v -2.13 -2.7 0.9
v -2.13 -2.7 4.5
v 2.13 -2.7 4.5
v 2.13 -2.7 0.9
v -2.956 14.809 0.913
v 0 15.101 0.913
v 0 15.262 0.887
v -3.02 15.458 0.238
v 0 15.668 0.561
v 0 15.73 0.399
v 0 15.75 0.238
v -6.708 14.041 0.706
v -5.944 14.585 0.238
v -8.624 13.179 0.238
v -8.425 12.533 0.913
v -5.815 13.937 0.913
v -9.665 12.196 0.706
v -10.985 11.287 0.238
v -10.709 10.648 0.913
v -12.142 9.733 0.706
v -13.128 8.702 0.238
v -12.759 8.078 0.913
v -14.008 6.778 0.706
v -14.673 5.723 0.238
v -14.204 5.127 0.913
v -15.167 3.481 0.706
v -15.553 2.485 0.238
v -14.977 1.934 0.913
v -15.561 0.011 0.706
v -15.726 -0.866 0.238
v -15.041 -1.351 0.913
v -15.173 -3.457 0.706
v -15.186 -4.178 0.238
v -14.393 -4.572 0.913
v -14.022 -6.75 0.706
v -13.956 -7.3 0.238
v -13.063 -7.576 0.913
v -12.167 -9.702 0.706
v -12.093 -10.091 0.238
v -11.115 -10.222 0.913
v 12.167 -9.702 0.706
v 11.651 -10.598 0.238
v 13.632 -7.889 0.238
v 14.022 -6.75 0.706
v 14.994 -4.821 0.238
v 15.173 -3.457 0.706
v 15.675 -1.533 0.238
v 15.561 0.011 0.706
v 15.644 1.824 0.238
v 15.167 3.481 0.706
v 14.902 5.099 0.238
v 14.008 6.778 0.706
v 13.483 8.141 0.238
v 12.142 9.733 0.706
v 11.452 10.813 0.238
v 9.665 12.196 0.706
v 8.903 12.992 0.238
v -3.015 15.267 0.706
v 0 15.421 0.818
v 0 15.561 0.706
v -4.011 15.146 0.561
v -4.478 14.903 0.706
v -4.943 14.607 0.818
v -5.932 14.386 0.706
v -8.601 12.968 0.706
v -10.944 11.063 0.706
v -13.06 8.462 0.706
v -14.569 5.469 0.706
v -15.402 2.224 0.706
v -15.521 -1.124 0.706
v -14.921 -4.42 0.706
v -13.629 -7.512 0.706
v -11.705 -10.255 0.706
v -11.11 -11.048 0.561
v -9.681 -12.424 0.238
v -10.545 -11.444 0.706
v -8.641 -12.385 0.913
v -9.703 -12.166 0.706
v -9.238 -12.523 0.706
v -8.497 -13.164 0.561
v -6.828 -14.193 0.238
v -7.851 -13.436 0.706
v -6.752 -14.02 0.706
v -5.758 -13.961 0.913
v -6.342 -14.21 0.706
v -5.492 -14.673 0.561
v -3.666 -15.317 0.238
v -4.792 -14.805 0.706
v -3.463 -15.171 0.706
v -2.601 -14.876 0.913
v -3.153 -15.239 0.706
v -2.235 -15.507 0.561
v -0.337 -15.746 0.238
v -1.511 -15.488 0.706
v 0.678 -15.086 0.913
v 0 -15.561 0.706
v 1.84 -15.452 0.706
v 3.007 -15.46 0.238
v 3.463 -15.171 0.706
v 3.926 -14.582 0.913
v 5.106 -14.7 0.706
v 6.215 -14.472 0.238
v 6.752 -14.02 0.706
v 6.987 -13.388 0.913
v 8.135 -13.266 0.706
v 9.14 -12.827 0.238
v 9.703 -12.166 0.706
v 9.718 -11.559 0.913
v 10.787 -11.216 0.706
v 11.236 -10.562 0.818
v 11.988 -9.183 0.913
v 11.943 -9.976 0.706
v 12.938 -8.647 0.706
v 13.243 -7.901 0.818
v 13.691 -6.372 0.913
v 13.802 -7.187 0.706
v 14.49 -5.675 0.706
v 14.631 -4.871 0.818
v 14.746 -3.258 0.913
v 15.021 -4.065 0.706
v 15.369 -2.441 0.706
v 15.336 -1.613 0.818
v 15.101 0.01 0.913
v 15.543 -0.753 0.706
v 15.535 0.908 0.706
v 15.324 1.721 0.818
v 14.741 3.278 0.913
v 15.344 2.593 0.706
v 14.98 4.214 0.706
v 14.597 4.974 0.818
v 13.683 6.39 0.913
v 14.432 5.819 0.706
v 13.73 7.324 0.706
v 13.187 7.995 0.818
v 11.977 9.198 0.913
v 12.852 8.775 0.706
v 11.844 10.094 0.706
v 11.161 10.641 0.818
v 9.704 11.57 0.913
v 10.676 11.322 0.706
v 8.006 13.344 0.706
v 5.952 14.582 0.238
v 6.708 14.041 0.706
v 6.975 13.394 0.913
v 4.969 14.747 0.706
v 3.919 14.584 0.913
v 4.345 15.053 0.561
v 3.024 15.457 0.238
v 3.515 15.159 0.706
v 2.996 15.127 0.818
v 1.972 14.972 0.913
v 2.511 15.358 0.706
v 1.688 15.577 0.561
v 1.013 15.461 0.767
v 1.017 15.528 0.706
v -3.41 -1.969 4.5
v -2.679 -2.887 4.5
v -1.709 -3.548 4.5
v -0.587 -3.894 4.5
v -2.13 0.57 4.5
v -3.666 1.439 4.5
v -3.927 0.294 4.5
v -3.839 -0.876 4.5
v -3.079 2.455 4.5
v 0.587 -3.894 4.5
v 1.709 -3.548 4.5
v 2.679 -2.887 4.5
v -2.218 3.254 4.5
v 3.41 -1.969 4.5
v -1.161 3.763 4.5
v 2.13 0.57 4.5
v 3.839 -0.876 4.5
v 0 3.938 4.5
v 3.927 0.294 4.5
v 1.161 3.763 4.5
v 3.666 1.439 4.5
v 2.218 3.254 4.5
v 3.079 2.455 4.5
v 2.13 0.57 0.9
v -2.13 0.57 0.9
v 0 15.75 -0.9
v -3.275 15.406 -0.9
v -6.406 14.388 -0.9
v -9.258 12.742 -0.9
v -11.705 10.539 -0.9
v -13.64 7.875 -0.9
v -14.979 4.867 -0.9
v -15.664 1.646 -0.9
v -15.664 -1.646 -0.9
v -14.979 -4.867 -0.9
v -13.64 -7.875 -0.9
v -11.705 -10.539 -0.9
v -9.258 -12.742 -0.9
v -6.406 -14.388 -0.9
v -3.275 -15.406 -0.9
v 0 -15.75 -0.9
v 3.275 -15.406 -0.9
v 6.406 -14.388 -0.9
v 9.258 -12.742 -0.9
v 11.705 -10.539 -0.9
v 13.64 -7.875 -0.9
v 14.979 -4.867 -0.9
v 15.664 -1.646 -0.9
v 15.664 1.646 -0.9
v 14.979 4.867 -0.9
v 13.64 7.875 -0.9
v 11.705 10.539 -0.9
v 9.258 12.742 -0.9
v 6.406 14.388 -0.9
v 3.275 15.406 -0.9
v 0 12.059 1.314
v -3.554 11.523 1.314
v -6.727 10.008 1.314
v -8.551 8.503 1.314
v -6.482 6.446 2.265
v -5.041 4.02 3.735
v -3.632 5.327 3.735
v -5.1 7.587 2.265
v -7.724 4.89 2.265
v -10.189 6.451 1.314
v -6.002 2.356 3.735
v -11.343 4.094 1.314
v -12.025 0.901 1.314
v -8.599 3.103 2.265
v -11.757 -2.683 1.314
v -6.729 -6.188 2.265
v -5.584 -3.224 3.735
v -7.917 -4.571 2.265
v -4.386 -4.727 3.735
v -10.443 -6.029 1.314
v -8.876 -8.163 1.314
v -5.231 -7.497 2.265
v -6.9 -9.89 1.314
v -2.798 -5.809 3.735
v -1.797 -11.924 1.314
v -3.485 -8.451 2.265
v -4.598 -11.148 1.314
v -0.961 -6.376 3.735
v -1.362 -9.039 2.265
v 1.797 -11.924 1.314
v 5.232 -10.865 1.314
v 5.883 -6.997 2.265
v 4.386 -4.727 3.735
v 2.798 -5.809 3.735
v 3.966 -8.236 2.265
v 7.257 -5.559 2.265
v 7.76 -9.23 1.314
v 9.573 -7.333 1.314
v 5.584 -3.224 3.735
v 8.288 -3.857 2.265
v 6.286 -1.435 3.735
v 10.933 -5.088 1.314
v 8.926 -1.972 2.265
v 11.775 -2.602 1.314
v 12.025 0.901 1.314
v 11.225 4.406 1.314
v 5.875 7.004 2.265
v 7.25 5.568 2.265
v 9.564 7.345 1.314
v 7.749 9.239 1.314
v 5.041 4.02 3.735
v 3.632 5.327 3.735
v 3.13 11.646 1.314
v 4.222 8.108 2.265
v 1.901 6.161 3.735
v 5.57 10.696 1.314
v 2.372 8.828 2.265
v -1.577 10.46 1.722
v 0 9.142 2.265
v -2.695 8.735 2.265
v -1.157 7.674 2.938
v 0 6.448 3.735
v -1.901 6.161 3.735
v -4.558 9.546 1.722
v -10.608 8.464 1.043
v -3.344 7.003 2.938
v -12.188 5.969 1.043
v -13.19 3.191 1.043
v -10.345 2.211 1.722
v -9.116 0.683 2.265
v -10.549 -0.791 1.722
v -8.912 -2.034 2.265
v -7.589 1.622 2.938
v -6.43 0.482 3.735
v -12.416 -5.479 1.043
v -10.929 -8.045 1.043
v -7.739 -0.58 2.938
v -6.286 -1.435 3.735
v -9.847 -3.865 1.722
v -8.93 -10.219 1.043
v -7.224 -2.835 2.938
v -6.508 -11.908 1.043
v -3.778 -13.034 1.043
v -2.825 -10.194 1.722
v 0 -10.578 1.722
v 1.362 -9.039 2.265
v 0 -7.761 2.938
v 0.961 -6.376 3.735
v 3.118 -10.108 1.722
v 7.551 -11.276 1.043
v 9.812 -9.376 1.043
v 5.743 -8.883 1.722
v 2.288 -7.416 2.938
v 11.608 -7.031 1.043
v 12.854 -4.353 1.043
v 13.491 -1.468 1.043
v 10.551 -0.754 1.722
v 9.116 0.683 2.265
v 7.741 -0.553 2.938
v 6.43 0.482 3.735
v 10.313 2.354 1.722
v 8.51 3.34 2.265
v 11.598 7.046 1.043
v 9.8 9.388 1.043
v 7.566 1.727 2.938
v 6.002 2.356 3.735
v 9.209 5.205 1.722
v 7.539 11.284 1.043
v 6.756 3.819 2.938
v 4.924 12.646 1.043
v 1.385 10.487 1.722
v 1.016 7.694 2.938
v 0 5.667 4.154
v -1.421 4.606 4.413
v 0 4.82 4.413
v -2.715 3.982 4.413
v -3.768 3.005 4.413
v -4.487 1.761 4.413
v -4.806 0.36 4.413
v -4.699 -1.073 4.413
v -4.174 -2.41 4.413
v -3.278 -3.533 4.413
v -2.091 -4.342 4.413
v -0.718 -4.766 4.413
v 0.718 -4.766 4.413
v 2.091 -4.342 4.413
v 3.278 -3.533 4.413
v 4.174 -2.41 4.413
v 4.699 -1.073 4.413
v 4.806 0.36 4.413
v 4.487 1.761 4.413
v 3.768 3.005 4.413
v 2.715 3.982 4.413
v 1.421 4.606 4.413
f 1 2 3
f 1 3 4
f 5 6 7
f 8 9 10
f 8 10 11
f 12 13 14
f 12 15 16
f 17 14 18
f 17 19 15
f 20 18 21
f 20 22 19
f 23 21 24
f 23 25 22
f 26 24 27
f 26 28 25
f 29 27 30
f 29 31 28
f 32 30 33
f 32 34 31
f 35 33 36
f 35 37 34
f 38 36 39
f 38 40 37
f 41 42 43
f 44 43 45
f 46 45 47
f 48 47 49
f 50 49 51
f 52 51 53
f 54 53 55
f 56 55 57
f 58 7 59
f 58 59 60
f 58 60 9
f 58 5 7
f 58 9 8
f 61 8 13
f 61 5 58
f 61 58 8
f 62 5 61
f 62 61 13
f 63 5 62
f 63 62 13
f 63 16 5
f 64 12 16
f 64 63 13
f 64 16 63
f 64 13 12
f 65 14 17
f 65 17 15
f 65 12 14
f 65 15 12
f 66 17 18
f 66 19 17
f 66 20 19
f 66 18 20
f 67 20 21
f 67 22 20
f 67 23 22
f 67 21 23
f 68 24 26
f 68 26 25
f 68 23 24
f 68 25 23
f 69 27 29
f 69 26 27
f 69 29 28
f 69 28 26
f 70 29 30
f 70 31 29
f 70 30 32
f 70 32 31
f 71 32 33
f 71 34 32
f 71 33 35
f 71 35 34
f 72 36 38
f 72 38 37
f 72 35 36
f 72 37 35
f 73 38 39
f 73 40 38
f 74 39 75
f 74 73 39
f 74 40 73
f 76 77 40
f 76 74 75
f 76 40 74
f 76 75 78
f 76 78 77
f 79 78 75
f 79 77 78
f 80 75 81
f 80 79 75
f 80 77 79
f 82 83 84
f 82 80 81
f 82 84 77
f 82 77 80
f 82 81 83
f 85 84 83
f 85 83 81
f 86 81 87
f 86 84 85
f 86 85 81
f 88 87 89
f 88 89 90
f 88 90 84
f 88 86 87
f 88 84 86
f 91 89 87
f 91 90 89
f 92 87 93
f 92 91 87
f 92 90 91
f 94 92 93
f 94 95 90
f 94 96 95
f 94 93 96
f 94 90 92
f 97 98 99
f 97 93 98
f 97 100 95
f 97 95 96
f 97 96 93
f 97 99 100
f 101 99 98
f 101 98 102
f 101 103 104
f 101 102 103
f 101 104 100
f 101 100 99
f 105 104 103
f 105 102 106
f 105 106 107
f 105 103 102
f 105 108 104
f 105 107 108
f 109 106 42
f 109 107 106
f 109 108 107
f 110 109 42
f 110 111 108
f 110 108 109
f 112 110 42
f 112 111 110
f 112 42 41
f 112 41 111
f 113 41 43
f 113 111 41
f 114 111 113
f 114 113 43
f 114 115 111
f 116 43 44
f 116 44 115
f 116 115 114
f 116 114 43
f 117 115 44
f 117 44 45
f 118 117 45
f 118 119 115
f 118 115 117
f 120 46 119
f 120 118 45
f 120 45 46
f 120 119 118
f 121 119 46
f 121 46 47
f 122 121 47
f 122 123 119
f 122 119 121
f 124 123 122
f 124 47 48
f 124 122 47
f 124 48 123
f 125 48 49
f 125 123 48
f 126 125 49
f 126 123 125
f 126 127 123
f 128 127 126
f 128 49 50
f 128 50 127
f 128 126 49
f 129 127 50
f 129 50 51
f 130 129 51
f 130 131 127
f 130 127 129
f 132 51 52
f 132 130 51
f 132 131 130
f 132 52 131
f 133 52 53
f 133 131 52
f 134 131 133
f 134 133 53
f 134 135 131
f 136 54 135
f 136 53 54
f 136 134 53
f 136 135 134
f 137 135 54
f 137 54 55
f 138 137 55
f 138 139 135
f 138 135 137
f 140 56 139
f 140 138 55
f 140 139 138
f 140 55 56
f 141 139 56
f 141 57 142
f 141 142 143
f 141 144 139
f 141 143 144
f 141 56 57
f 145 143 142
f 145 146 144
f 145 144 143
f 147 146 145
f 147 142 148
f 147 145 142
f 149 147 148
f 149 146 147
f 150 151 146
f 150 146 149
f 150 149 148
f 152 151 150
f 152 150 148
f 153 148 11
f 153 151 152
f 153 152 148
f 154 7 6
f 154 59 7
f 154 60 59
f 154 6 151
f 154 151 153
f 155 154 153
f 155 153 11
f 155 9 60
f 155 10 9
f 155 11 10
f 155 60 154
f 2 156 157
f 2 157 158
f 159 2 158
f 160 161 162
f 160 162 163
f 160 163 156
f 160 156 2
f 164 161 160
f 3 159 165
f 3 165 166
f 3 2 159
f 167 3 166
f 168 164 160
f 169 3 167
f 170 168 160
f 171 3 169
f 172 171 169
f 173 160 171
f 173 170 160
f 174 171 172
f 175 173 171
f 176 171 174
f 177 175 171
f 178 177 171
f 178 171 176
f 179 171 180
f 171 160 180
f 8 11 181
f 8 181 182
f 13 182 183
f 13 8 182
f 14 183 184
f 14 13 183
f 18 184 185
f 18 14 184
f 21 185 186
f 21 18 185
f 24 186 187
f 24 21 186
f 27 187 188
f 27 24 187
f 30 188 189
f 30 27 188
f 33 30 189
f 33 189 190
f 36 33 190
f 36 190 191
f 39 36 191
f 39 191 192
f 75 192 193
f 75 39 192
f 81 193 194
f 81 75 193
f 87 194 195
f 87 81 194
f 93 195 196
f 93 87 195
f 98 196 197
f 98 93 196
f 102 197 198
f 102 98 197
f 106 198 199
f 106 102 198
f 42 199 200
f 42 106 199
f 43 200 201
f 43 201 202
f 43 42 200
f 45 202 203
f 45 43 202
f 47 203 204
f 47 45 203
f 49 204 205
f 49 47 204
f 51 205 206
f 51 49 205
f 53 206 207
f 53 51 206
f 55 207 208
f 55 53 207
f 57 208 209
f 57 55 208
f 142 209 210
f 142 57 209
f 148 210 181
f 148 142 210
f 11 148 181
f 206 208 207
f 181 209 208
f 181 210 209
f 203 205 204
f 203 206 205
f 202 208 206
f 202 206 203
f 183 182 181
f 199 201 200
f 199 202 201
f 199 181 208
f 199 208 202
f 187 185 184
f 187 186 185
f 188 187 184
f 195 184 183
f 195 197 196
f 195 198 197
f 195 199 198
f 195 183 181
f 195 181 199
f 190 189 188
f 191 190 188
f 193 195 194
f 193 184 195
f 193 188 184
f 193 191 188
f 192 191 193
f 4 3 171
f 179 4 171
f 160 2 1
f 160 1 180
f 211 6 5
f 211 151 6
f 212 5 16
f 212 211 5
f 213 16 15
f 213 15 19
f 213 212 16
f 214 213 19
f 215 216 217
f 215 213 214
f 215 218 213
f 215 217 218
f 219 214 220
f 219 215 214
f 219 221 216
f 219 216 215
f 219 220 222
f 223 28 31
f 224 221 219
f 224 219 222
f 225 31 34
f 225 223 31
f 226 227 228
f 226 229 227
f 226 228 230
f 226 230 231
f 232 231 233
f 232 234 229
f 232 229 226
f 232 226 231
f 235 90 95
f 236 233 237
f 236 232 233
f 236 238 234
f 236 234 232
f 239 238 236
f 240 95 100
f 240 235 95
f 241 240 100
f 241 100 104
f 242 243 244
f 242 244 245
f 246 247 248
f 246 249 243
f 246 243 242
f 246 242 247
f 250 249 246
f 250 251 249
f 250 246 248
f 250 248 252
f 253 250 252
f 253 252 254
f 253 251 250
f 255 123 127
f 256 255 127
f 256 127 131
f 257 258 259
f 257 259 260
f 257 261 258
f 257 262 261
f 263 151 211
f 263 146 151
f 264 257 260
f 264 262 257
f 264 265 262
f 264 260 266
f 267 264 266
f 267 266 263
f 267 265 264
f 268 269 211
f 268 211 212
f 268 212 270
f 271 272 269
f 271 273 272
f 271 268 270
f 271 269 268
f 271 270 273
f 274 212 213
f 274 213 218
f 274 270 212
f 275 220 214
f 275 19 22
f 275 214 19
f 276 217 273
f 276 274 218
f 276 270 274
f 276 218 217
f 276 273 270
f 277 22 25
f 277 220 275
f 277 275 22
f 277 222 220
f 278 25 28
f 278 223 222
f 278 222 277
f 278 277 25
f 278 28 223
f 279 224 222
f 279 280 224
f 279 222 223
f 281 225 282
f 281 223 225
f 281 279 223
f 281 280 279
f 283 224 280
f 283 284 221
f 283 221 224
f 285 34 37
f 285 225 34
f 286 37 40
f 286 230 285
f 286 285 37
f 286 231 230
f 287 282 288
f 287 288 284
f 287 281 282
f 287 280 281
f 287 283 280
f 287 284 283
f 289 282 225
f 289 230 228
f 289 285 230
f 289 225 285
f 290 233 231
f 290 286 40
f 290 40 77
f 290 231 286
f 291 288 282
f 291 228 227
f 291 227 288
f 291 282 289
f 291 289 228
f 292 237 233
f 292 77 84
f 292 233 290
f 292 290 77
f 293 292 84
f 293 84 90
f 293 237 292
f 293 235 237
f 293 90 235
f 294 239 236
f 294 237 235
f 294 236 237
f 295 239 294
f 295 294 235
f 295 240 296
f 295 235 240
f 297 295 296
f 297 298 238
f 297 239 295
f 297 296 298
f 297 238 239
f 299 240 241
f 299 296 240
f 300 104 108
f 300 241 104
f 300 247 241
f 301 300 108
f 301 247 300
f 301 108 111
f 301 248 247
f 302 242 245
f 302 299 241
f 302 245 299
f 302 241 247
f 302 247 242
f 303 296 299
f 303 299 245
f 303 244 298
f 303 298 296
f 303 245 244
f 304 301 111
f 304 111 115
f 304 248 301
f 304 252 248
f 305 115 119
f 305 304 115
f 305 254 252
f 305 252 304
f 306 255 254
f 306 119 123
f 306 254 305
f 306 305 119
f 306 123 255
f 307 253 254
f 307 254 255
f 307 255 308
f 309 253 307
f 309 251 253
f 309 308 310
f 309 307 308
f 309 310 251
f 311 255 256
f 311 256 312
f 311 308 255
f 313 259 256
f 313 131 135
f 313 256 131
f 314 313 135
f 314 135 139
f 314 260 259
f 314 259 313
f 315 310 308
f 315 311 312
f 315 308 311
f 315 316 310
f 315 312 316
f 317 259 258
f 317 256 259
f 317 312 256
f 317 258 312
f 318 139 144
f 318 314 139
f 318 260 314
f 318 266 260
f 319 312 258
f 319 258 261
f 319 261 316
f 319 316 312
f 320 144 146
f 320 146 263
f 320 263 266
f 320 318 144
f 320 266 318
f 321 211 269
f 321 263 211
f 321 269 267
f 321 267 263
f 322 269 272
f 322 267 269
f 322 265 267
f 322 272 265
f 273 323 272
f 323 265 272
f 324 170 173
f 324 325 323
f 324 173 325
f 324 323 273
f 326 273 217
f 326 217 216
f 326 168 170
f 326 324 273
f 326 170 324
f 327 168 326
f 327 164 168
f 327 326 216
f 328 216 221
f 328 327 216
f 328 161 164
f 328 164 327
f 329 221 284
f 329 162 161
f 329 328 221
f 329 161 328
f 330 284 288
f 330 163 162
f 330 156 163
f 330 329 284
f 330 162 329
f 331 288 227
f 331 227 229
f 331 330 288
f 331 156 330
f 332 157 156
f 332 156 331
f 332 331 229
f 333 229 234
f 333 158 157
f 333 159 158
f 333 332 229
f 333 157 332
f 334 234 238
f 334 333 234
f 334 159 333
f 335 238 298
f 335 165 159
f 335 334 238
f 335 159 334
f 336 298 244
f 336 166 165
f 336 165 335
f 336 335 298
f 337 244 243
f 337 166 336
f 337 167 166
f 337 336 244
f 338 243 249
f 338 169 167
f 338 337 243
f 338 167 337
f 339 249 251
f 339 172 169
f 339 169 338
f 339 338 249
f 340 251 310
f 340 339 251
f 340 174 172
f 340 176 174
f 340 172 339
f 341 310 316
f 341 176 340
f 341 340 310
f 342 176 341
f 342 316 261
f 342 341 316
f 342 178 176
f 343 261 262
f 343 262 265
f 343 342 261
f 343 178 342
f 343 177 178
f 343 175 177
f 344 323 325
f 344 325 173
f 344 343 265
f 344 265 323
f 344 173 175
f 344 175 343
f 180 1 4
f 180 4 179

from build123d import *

# Parameters (mm, degrees)
F0_W     = 17.5
F0_H     = 2
F2_W     = 4
F2_H     = 4
F3_DEPTH = 4
F4_R     = 0.75
F5_SCALE = 0.9
F6_DEPTH = 0.33
F7_DEPTH = 0.33
F8_DEPTH = 0.33


with BuildPart() as f1:
    # F0 (on Right) → F1 (revolve)
    with BuildSketch(Plane.YZ):
        with BuildLine():
            Line((0, 1), (17.5, 1))
            ThreePointArc((17.5, 1), (12.0974696672, 1.8050013115), (7.164313392, 4.1500664011))
            ThreePointArc((7.164313392, 4.1500664011), (5.8332762858, 4.7827989716), (4.3755952516, 5))
            Line((4.3755952516, 5), (0, 5))
            Line((0, 5), (0, 1))
        make_face()
        with Locations((8.75, 0)):
            Rectangle(F0_W, F0_H)
    revolve(axis=Axis((0, 0, 2), (0, 0, 1)))

    # F2 (on face) → F3 (cut)
    with BuildSketch(Plane.XY.offset(5)):
        with Locations((0, -1)):
            Rectangle(F2_W, F2_H)
    extrude(amount=-F3_DEPTH, mode=Mode.SUBTRACT)

    # F4
    f4_edges = [f1.edges().sort_by_distance(p)[0] for p in [
        (0, -17.5, 1),
    ]]
    fillet(f4_edges, radius=F4_R)


with BuildPart() as f1_1:
    # F5: moved
    add(f1.part.scale(F5_SCALE))

    # F6 (cut): a face of the model
    f6_faces = [f1_1.faces().sort_by_distance(p)[0] for p in [
        (-1.8, -0.9, 2.7),
    ]]
    extrude(f6_faces, amount=-F6_DEPTH, mode=Mode.SUBTRACT)

    # F7 (cut): a face of the model
    f7_faces = [f1_1.faces().sort_by_distance(p)[0] for p in [
        (1.8, -0.9, 2.7),
    ]]
    extrude(f7_faces, amount=-F7_DEPTH, mode=Mode.SUBTRACT)

    # F8 (add): a face of the model
    f8_faces = [f1_1.faces().sort_by_distance(p)[0] for p in [
        (0, 0.9, 2.7),
    ]]
    extrude(f8_faces, amount=F8_DEPTH)


solid = f1_1.part
